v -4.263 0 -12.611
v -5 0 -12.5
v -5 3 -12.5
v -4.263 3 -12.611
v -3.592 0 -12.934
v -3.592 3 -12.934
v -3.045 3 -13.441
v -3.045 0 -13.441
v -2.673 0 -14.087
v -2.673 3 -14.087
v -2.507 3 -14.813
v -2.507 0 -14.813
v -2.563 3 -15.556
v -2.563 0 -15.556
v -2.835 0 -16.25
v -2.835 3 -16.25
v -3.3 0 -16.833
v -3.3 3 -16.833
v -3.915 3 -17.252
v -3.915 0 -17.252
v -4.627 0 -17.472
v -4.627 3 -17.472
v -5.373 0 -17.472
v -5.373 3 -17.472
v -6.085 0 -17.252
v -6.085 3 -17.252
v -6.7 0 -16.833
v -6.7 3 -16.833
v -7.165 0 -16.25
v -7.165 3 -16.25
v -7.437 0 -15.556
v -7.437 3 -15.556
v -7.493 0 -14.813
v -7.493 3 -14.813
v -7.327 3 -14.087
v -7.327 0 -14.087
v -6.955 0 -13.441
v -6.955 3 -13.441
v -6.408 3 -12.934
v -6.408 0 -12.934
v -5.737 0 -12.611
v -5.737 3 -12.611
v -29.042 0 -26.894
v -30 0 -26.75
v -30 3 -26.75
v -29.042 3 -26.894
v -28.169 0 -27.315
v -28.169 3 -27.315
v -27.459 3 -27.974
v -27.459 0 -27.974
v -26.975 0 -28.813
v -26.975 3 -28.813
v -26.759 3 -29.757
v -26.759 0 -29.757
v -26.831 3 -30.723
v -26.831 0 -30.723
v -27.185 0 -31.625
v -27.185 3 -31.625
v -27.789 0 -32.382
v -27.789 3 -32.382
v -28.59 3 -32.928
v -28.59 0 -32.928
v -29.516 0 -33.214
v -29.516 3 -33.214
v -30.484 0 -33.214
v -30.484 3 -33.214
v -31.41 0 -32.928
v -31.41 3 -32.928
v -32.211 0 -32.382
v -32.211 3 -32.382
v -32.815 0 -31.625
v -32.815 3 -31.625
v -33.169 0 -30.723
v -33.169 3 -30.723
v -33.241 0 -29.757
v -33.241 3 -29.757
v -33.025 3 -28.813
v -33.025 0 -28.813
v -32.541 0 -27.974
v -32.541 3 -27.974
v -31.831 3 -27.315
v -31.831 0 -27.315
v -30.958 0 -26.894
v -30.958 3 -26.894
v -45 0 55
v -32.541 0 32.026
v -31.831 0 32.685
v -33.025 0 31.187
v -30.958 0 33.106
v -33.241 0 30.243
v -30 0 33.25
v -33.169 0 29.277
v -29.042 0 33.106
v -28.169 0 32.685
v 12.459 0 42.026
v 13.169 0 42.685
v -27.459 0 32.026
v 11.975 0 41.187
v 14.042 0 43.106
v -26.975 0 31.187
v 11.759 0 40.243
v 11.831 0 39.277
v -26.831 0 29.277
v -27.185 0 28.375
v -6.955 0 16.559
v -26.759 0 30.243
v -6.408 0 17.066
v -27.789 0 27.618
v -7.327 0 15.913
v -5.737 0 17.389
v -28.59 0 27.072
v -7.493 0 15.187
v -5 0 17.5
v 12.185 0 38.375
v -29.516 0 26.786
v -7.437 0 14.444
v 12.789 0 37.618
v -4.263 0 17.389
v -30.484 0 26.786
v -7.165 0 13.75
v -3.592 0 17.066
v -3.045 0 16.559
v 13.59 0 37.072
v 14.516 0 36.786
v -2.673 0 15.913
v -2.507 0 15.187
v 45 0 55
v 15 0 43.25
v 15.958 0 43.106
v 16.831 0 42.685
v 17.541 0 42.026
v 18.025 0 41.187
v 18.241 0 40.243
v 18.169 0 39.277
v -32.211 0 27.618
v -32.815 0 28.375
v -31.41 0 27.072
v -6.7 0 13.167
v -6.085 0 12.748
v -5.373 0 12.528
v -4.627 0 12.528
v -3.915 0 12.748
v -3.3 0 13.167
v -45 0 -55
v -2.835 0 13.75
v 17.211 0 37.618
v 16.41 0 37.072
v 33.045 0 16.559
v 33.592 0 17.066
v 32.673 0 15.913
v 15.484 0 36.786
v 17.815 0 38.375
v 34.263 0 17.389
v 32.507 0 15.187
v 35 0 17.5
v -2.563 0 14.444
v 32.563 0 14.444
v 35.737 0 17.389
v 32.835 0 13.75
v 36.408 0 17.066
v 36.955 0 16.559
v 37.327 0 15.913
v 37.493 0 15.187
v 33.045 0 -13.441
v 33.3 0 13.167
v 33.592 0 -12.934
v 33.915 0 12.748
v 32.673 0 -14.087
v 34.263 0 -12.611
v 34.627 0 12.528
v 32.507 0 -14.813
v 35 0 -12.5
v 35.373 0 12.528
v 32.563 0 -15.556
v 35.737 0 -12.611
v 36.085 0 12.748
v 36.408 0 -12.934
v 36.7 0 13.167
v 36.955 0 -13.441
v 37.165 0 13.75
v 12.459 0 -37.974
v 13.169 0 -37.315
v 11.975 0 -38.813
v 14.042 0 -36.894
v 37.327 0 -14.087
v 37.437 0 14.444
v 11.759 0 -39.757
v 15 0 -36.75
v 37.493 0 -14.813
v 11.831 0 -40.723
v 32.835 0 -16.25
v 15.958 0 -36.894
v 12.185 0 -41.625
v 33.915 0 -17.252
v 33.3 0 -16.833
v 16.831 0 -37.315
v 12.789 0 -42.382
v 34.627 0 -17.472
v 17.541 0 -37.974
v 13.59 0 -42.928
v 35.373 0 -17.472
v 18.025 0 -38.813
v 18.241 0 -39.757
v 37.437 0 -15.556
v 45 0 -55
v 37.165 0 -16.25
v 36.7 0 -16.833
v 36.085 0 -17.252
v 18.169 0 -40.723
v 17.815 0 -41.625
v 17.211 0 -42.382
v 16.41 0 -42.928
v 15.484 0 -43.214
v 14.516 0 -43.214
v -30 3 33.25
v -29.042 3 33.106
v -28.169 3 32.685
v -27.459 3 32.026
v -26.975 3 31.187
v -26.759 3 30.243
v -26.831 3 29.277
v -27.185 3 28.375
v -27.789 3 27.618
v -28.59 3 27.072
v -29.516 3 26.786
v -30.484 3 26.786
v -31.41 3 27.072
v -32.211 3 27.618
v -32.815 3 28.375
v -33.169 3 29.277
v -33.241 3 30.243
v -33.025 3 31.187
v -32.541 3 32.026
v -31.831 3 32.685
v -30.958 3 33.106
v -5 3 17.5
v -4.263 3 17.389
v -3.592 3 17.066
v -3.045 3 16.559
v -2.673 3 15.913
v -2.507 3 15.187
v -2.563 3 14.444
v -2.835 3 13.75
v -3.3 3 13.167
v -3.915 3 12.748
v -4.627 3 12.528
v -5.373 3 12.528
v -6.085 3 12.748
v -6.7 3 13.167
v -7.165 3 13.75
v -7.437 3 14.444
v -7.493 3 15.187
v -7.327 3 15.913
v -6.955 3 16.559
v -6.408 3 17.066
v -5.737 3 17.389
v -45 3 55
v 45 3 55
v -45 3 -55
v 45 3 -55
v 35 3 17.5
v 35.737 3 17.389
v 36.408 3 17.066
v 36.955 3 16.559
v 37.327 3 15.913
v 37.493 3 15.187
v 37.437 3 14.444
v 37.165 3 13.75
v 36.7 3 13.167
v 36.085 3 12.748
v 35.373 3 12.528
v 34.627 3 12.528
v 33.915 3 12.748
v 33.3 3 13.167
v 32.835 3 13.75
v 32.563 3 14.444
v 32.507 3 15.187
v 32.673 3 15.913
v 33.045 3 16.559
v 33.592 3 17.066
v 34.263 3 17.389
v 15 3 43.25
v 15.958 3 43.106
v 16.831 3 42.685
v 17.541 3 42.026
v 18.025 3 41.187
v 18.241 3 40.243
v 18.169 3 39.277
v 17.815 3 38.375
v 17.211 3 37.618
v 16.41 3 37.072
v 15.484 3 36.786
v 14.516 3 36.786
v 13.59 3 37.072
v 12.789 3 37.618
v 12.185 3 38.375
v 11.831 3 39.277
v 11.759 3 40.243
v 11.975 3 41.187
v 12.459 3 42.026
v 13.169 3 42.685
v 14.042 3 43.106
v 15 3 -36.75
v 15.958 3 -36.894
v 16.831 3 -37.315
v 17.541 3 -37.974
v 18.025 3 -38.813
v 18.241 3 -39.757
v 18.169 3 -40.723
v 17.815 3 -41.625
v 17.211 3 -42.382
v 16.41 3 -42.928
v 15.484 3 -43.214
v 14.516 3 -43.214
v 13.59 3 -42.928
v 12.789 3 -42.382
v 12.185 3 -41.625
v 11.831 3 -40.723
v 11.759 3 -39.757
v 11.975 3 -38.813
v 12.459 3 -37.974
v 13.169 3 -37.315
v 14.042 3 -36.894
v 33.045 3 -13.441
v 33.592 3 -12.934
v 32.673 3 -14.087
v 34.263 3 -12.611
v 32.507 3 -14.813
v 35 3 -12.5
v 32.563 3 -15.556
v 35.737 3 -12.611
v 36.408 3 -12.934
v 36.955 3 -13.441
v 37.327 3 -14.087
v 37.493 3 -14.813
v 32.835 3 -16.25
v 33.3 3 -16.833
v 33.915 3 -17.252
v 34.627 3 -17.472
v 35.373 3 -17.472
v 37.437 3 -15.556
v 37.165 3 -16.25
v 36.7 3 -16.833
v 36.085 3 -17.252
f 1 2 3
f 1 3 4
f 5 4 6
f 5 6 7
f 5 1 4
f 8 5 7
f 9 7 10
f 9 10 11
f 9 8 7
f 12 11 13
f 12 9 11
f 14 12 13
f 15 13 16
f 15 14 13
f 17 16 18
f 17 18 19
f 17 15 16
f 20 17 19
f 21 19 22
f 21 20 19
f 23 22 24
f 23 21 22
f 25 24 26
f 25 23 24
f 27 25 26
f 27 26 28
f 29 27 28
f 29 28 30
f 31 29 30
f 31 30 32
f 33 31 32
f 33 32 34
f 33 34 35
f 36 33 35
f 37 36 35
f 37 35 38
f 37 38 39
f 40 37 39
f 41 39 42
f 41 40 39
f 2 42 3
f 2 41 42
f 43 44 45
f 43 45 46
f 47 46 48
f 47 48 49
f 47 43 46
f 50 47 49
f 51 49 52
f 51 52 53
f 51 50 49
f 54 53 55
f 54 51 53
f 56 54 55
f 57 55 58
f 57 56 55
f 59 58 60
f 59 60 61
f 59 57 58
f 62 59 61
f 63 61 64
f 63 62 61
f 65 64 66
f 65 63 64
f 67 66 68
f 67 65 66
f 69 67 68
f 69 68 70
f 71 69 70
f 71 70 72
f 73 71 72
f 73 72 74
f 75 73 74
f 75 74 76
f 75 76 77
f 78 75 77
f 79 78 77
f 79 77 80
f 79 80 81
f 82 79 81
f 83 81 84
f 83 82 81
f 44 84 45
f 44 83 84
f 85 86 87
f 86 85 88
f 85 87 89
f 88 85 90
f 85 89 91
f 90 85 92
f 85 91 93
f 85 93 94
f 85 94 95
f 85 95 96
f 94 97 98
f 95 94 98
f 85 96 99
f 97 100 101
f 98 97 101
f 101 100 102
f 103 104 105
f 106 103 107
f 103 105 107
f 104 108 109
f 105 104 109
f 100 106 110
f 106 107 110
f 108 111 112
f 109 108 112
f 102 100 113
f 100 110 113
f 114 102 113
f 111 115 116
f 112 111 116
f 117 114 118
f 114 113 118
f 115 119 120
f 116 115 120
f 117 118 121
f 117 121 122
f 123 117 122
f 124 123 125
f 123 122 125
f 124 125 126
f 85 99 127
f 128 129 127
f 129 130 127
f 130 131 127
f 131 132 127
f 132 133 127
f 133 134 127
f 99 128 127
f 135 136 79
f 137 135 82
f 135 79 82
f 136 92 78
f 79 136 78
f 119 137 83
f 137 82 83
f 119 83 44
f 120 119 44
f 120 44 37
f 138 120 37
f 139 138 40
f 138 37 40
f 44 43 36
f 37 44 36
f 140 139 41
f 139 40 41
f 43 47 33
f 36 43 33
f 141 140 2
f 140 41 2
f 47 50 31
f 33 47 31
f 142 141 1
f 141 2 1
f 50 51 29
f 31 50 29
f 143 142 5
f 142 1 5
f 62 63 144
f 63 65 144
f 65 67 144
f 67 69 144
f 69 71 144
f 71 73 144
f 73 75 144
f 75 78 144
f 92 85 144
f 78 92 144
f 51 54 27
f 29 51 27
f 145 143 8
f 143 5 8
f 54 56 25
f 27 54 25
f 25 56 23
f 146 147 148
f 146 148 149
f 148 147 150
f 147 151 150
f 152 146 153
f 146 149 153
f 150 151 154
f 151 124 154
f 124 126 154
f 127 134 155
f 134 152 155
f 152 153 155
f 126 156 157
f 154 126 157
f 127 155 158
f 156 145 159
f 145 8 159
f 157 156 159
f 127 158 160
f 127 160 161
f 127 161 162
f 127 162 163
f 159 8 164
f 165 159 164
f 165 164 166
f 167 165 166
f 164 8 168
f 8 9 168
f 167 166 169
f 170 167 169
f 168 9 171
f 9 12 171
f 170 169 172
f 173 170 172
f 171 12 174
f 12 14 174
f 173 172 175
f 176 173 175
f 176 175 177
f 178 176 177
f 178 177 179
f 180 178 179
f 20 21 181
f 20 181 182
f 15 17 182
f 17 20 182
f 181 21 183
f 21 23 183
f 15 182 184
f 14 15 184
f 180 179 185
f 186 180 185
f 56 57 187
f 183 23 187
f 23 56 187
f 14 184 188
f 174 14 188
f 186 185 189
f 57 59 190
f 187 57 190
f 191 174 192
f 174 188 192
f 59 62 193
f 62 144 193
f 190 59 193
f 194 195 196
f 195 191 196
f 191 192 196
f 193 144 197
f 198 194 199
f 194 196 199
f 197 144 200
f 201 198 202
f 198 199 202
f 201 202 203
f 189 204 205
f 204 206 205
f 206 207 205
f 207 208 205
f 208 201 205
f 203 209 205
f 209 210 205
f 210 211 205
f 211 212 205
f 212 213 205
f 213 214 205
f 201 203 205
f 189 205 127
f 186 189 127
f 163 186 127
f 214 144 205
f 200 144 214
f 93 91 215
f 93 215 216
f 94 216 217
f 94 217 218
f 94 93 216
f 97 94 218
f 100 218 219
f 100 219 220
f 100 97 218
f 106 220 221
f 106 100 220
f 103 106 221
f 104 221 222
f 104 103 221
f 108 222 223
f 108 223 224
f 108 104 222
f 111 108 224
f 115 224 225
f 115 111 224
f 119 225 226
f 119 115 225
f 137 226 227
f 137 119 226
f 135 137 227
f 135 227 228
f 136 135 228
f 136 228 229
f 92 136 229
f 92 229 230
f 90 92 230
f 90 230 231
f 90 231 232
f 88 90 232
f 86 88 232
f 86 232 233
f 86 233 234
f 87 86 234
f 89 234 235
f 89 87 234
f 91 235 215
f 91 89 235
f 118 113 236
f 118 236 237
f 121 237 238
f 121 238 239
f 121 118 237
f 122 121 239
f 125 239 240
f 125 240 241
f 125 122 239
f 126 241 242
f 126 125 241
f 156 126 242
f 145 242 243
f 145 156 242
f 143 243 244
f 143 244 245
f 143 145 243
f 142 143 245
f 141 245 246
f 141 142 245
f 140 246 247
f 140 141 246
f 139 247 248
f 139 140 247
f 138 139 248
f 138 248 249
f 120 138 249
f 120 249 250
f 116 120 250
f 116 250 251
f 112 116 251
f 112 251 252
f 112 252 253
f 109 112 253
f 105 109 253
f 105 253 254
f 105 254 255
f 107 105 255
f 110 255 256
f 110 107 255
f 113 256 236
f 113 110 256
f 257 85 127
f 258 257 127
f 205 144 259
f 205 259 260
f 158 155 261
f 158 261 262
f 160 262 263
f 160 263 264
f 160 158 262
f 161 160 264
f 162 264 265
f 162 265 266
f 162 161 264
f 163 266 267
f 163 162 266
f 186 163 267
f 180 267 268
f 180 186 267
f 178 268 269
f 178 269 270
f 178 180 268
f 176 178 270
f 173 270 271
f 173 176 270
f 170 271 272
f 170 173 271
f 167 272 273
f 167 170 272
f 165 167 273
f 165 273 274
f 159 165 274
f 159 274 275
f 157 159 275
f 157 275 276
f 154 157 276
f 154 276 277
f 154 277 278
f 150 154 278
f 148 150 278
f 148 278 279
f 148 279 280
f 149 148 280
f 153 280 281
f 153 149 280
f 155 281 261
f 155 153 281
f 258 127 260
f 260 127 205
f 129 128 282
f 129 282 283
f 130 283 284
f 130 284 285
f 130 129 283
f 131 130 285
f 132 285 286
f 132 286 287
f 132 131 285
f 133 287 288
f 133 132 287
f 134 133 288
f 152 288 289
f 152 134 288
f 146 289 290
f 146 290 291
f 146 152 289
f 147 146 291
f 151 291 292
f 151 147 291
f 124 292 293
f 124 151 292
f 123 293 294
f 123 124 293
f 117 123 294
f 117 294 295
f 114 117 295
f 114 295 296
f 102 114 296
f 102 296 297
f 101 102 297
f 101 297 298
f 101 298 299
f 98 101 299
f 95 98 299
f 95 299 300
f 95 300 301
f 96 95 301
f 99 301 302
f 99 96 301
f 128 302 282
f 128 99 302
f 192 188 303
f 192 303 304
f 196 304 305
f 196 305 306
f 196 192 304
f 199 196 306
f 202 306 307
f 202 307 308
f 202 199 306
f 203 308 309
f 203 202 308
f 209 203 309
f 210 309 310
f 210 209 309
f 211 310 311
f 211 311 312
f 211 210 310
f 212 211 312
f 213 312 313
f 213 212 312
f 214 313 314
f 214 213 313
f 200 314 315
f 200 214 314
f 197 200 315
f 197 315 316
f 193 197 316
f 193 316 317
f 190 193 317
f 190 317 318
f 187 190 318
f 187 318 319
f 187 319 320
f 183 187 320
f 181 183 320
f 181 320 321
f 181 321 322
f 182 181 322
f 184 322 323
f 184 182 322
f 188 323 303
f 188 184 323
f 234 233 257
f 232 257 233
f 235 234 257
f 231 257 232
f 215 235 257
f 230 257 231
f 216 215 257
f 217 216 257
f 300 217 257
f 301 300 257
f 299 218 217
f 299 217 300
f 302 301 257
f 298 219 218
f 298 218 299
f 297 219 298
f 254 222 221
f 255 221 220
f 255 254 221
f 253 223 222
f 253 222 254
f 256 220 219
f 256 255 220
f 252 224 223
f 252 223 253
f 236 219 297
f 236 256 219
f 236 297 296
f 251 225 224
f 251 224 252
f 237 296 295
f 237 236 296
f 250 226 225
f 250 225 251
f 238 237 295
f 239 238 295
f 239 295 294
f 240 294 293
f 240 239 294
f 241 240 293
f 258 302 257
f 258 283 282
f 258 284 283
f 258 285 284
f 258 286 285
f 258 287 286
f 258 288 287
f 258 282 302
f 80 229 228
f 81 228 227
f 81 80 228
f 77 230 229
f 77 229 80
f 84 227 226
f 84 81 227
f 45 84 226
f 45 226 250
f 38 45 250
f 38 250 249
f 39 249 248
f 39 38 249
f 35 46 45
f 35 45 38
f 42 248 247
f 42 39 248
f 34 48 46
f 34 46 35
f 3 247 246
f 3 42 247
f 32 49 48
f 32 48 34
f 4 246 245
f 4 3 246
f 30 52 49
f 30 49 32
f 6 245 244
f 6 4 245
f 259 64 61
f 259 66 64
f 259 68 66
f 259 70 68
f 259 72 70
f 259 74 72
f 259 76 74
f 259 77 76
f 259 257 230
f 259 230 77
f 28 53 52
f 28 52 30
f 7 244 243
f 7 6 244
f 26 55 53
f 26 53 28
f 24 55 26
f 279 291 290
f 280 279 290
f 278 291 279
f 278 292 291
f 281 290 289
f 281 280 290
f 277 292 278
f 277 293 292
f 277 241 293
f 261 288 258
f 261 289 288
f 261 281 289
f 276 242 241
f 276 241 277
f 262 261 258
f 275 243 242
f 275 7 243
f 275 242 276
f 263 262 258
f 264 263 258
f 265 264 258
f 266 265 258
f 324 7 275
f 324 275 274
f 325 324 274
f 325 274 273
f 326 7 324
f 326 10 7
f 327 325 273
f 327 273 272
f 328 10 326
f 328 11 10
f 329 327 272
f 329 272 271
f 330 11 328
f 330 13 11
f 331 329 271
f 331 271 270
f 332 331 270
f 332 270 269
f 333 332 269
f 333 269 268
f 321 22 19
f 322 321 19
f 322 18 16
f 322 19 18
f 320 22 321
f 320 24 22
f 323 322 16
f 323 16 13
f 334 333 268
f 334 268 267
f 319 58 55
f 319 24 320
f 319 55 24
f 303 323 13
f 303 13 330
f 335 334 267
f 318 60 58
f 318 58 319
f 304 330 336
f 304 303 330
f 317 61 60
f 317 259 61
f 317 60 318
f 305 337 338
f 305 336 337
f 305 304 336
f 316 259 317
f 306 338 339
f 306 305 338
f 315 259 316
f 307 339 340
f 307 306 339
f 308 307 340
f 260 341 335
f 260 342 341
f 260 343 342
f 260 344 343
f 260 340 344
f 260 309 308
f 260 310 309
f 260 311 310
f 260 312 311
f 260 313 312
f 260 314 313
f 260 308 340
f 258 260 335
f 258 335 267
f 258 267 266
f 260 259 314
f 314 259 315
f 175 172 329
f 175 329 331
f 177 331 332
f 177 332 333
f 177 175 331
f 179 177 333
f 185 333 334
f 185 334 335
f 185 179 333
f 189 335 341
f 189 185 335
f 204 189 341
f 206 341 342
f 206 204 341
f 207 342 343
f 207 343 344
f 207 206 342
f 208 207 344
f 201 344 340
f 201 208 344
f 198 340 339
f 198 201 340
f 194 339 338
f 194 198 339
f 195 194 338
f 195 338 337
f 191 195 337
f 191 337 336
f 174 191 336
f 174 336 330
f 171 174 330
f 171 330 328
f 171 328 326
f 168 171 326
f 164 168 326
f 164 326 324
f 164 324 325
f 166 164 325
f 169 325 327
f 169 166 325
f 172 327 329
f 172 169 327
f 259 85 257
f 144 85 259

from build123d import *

# Parameters (mm, degrees)
SKETCH1_W           = 90
SKETCH1_H           = 110
SKETCH1_R           = 3.25
SKETCH1_R_2         = 2.5
BOSS_EXTRUDE1_DEPTH = 3


with BuildPart() as part:
    # Sketch1 → Boss-Extrude1 (new body)
    with BuildSketch(Plane(origin=(0, 0, 0), x_dir=(1, 0, 0), z_dir=(0, 1, 0))):
        Rectangle(SKETCH1_W, SKETCH1_H)
        with Locations(Location((-30, 30, 0), (0, 0, 270))):
            Circle(SKETCH1_R, mode=Mode.SUBTRACT)
        with Locations(Location((-30, -30, 0), (0, 0, 270))):
            Circle(SKETCH1_R, mode=Mode.SUBTRACT)
        with Locations(Location((-5, 15, 0), (0, 0, 270))):
            Circle(SKETCH1_R_2, mode=Mode.SUBTRACT)
        with Locations(Location((35, 15, 0), (0, 0, 270))):
            Circle(SKETCH1_R_2, mode=Mode.SUBTRACT)
        with Locations(Location((35, -15, 0), (0, 0, 270))):
            Circle(SKETCH1_R_2, mode=Mode.SUBTRACT)
        with Locations(Location((-5, -15, 0), (0, 0, 270))):
            Circle(SKETCH1_R_2, mode=Mode.SUBTRACT)
        with Locations(Location((15, -40, 0), (0, 0, 270))):
            Circle(SKETCH1_R, mode=Mode.SUBTRACT)
        with Locations(Location((15, 40, 0), (0, 0, 270))):
            Circle(SKETCH1_R, mode=Mode.SUBTRACT)
    extrude(amount=BOSS_EXTRUDE1_DEPTH)


solid = part.part
